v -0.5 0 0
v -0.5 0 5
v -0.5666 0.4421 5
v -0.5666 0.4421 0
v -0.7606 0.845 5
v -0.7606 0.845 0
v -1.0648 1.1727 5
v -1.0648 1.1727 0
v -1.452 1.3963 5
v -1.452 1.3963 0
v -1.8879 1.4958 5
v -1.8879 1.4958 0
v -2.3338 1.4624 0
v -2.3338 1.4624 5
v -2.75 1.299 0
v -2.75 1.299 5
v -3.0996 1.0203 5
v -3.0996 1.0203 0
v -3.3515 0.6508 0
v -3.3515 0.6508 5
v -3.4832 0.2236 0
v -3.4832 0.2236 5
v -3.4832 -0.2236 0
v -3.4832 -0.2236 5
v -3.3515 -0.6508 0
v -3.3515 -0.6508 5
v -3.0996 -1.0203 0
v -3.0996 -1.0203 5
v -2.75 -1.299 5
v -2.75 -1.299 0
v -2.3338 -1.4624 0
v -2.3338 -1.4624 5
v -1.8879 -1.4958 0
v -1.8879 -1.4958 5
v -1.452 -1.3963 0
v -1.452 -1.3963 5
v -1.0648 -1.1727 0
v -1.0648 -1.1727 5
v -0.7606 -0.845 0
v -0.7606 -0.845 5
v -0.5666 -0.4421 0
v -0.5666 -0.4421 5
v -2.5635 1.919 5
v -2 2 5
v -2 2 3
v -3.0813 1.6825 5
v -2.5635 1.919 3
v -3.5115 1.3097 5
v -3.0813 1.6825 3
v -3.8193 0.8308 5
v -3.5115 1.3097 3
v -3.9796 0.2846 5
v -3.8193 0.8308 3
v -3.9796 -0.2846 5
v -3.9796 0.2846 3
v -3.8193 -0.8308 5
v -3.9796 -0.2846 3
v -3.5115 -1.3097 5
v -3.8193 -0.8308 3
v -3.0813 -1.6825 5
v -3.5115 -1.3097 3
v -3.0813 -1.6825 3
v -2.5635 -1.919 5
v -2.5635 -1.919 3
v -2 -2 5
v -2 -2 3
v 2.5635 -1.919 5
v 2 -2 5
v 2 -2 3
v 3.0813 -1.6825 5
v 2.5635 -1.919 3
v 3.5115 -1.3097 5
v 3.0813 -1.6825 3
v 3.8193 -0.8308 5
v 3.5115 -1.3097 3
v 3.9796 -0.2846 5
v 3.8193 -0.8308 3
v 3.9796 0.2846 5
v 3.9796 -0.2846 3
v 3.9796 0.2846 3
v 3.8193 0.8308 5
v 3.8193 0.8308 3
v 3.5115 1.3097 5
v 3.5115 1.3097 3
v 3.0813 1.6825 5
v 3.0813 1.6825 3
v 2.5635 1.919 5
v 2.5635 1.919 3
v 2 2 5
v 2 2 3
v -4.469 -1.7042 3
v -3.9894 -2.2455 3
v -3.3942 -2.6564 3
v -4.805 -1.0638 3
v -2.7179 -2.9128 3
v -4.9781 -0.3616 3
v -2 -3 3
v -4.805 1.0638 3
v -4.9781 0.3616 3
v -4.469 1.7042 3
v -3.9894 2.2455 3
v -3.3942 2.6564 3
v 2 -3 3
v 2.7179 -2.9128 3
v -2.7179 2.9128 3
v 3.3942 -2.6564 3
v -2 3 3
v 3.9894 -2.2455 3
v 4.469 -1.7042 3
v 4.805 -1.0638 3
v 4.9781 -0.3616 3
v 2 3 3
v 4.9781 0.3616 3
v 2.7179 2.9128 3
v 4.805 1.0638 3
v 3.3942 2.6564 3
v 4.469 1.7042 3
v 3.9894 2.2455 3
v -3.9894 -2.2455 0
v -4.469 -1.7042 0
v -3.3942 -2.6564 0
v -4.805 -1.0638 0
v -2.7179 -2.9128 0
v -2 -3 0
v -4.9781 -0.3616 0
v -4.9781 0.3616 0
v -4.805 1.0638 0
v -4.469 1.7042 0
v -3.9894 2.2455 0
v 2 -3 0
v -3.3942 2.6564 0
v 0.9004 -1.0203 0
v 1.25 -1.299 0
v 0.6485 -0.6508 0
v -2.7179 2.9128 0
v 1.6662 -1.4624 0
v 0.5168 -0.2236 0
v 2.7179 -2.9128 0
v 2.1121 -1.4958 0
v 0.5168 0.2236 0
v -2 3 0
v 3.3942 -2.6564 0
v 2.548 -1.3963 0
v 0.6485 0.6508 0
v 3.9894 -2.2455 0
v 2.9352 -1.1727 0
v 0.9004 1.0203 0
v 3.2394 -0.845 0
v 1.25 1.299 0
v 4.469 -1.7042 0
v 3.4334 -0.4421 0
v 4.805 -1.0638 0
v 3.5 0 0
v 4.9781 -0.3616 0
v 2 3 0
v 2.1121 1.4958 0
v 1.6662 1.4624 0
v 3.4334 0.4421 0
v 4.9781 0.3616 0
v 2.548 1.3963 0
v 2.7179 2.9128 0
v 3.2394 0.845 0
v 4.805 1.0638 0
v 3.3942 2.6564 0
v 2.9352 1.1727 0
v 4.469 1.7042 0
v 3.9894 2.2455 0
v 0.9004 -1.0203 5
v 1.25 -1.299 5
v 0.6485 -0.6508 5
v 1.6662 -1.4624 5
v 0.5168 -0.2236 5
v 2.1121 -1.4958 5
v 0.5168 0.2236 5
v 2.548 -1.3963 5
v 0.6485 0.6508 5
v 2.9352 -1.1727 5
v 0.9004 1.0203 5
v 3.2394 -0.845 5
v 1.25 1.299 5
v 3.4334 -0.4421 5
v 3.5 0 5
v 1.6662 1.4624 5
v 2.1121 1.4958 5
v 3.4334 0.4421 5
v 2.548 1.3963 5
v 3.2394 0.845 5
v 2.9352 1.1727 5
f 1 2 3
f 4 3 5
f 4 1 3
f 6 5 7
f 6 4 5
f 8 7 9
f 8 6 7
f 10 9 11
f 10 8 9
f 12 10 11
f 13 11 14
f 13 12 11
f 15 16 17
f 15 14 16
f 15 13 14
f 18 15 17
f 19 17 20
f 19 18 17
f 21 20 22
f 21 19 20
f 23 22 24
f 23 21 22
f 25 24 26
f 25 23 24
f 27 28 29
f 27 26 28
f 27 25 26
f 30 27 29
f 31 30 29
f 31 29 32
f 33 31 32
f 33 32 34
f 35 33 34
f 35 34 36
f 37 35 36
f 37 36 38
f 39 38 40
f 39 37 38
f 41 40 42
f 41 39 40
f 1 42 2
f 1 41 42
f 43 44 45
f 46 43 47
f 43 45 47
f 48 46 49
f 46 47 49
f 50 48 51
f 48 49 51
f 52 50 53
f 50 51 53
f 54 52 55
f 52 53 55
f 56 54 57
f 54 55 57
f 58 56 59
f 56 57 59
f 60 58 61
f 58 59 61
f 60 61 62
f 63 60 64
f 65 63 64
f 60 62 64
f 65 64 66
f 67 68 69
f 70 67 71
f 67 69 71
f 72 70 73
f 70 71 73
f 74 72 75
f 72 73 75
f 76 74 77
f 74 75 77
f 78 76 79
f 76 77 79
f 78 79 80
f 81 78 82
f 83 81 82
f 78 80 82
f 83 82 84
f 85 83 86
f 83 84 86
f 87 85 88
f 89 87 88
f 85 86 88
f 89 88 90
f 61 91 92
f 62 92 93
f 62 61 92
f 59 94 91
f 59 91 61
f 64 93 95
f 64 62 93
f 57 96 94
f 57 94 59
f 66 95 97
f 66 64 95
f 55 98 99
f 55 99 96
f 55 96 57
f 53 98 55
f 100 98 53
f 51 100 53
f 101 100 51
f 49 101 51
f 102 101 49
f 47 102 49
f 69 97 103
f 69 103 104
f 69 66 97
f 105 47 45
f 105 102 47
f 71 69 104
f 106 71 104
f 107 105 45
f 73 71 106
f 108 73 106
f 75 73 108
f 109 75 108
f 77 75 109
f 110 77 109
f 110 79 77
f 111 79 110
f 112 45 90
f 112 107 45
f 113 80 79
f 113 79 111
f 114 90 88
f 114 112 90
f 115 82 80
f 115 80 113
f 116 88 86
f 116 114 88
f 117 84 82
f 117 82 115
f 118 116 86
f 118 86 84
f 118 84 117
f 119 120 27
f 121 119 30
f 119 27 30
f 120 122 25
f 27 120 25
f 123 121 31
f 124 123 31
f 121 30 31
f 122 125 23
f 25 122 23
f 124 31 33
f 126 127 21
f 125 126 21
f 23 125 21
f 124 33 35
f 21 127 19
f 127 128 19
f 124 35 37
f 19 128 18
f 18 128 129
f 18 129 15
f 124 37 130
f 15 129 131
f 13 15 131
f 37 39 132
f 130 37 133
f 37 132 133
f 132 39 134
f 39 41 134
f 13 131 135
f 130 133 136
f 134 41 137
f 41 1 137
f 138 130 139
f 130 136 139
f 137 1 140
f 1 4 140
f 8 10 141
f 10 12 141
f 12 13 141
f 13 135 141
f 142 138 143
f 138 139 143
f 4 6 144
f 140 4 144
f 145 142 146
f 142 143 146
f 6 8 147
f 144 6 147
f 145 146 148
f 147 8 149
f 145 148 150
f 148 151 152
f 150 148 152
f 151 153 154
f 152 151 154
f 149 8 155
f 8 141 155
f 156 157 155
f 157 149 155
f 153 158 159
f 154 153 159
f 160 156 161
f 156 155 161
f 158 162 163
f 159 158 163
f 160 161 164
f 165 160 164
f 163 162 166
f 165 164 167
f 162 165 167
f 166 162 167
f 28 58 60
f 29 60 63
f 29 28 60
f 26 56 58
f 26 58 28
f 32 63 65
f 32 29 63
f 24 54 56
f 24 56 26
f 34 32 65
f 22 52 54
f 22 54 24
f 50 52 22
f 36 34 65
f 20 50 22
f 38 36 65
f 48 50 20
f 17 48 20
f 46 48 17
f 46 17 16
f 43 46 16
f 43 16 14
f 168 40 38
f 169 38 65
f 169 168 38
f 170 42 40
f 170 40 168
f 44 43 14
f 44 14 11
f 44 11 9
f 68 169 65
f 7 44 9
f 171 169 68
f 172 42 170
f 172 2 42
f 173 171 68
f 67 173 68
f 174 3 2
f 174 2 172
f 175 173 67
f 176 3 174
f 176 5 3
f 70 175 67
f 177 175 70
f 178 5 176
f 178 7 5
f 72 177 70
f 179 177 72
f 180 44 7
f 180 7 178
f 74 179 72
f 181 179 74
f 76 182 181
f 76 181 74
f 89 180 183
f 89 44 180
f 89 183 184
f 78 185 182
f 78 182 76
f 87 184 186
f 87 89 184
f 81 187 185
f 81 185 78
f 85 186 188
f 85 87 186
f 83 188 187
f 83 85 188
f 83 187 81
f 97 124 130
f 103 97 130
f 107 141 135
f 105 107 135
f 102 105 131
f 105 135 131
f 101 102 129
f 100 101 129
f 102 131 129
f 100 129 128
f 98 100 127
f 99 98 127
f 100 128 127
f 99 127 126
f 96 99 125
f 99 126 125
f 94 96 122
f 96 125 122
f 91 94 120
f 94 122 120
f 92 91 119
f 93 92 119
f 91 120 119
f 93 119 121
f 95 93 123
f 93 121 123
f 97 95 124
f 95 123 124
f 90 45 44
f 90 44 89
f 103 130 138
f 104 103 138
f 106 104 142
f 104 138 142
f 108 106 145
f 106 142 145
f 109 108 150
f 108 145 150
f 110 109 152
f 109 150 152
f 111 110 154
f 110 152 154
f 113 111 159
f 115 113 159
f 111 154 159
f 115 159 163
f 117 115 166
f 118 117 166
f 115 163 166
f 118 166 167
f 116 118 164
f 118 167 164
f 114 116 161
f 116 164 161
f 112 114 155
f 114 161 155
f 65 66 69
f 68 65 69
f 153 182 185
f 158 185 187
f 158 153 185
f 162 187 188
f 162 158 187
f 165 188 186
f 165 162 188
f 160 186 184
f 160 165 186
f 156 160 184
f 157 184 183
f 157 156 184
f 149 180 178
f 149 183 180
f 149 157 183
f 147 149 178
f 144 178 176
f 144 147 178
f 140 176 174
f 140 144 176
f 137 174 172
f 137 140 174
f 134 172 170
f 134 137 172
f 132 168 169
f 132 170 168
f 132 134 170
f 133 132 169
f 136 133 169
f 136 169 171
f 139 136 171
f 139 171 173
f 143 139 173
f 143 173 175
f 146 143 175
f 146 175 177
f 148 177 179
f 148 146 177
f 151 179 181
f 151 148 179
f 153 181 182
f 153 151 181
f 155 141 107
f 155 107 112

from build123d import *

# Parameters (mm, degrees)
SKETCH_1_R          = 3
SKETCH_1_W          = 4
SKETCH_1_H          = 6
EXTRUDE_1_DEPTH     = 3
SKETCH_1_4_R        = 2
SKETCH_1_4_W        = 4
SKETCH_1_4_H        = 4
EXTRUDE_2_DEPTH     = 5
SKETCH_1_5_R        = 1.5
CUT_EXTRUDE_1_DEPTH = 6


with BuildPart() as part:
    # Sketch 1 → Extrude 1 (new body)
    with BuildSketch(Plane.XY):
        with Locations((-2, 0)):
            Circle(SKETCH_1_R)
        with Locations((2, 0)):
            Circle(SKETCH_1_R)
        Rectangle(SKETCH_1_W, SKETCH_1_H)
    extrude(amount=EXTRUDE_1_DEPTH)

    # Sketch 1_4 → Extrude 2 (add)
    with BuildSketch(Plane.XY):
        with Locations((-2, 0)):
            Circle(SKETCH_1_4_R)
        with Locations((2, 0)):
            Circle(SKETCH_1_4_R)
        Rectangle(SKETCH_1_4_W, SKETCH_1_4_H)
    extrude(amount=EXTRUDE_2_DEPTH)

    # Sketch 1_5 → Cut-Extrude 1 (cut, through all)
    with BuildSketch(Plane.XY):
        with Locations((-2, 0)):
            Circle(SKETCH_1_5_R)
        with Locations((2, 0)):
            Circle(SKETCH_1_5_R)
    extrude(amount=CUT_EXTRUDE_1_DEPTH, mode=Mode.SUBTRACT)


solid = part.part
